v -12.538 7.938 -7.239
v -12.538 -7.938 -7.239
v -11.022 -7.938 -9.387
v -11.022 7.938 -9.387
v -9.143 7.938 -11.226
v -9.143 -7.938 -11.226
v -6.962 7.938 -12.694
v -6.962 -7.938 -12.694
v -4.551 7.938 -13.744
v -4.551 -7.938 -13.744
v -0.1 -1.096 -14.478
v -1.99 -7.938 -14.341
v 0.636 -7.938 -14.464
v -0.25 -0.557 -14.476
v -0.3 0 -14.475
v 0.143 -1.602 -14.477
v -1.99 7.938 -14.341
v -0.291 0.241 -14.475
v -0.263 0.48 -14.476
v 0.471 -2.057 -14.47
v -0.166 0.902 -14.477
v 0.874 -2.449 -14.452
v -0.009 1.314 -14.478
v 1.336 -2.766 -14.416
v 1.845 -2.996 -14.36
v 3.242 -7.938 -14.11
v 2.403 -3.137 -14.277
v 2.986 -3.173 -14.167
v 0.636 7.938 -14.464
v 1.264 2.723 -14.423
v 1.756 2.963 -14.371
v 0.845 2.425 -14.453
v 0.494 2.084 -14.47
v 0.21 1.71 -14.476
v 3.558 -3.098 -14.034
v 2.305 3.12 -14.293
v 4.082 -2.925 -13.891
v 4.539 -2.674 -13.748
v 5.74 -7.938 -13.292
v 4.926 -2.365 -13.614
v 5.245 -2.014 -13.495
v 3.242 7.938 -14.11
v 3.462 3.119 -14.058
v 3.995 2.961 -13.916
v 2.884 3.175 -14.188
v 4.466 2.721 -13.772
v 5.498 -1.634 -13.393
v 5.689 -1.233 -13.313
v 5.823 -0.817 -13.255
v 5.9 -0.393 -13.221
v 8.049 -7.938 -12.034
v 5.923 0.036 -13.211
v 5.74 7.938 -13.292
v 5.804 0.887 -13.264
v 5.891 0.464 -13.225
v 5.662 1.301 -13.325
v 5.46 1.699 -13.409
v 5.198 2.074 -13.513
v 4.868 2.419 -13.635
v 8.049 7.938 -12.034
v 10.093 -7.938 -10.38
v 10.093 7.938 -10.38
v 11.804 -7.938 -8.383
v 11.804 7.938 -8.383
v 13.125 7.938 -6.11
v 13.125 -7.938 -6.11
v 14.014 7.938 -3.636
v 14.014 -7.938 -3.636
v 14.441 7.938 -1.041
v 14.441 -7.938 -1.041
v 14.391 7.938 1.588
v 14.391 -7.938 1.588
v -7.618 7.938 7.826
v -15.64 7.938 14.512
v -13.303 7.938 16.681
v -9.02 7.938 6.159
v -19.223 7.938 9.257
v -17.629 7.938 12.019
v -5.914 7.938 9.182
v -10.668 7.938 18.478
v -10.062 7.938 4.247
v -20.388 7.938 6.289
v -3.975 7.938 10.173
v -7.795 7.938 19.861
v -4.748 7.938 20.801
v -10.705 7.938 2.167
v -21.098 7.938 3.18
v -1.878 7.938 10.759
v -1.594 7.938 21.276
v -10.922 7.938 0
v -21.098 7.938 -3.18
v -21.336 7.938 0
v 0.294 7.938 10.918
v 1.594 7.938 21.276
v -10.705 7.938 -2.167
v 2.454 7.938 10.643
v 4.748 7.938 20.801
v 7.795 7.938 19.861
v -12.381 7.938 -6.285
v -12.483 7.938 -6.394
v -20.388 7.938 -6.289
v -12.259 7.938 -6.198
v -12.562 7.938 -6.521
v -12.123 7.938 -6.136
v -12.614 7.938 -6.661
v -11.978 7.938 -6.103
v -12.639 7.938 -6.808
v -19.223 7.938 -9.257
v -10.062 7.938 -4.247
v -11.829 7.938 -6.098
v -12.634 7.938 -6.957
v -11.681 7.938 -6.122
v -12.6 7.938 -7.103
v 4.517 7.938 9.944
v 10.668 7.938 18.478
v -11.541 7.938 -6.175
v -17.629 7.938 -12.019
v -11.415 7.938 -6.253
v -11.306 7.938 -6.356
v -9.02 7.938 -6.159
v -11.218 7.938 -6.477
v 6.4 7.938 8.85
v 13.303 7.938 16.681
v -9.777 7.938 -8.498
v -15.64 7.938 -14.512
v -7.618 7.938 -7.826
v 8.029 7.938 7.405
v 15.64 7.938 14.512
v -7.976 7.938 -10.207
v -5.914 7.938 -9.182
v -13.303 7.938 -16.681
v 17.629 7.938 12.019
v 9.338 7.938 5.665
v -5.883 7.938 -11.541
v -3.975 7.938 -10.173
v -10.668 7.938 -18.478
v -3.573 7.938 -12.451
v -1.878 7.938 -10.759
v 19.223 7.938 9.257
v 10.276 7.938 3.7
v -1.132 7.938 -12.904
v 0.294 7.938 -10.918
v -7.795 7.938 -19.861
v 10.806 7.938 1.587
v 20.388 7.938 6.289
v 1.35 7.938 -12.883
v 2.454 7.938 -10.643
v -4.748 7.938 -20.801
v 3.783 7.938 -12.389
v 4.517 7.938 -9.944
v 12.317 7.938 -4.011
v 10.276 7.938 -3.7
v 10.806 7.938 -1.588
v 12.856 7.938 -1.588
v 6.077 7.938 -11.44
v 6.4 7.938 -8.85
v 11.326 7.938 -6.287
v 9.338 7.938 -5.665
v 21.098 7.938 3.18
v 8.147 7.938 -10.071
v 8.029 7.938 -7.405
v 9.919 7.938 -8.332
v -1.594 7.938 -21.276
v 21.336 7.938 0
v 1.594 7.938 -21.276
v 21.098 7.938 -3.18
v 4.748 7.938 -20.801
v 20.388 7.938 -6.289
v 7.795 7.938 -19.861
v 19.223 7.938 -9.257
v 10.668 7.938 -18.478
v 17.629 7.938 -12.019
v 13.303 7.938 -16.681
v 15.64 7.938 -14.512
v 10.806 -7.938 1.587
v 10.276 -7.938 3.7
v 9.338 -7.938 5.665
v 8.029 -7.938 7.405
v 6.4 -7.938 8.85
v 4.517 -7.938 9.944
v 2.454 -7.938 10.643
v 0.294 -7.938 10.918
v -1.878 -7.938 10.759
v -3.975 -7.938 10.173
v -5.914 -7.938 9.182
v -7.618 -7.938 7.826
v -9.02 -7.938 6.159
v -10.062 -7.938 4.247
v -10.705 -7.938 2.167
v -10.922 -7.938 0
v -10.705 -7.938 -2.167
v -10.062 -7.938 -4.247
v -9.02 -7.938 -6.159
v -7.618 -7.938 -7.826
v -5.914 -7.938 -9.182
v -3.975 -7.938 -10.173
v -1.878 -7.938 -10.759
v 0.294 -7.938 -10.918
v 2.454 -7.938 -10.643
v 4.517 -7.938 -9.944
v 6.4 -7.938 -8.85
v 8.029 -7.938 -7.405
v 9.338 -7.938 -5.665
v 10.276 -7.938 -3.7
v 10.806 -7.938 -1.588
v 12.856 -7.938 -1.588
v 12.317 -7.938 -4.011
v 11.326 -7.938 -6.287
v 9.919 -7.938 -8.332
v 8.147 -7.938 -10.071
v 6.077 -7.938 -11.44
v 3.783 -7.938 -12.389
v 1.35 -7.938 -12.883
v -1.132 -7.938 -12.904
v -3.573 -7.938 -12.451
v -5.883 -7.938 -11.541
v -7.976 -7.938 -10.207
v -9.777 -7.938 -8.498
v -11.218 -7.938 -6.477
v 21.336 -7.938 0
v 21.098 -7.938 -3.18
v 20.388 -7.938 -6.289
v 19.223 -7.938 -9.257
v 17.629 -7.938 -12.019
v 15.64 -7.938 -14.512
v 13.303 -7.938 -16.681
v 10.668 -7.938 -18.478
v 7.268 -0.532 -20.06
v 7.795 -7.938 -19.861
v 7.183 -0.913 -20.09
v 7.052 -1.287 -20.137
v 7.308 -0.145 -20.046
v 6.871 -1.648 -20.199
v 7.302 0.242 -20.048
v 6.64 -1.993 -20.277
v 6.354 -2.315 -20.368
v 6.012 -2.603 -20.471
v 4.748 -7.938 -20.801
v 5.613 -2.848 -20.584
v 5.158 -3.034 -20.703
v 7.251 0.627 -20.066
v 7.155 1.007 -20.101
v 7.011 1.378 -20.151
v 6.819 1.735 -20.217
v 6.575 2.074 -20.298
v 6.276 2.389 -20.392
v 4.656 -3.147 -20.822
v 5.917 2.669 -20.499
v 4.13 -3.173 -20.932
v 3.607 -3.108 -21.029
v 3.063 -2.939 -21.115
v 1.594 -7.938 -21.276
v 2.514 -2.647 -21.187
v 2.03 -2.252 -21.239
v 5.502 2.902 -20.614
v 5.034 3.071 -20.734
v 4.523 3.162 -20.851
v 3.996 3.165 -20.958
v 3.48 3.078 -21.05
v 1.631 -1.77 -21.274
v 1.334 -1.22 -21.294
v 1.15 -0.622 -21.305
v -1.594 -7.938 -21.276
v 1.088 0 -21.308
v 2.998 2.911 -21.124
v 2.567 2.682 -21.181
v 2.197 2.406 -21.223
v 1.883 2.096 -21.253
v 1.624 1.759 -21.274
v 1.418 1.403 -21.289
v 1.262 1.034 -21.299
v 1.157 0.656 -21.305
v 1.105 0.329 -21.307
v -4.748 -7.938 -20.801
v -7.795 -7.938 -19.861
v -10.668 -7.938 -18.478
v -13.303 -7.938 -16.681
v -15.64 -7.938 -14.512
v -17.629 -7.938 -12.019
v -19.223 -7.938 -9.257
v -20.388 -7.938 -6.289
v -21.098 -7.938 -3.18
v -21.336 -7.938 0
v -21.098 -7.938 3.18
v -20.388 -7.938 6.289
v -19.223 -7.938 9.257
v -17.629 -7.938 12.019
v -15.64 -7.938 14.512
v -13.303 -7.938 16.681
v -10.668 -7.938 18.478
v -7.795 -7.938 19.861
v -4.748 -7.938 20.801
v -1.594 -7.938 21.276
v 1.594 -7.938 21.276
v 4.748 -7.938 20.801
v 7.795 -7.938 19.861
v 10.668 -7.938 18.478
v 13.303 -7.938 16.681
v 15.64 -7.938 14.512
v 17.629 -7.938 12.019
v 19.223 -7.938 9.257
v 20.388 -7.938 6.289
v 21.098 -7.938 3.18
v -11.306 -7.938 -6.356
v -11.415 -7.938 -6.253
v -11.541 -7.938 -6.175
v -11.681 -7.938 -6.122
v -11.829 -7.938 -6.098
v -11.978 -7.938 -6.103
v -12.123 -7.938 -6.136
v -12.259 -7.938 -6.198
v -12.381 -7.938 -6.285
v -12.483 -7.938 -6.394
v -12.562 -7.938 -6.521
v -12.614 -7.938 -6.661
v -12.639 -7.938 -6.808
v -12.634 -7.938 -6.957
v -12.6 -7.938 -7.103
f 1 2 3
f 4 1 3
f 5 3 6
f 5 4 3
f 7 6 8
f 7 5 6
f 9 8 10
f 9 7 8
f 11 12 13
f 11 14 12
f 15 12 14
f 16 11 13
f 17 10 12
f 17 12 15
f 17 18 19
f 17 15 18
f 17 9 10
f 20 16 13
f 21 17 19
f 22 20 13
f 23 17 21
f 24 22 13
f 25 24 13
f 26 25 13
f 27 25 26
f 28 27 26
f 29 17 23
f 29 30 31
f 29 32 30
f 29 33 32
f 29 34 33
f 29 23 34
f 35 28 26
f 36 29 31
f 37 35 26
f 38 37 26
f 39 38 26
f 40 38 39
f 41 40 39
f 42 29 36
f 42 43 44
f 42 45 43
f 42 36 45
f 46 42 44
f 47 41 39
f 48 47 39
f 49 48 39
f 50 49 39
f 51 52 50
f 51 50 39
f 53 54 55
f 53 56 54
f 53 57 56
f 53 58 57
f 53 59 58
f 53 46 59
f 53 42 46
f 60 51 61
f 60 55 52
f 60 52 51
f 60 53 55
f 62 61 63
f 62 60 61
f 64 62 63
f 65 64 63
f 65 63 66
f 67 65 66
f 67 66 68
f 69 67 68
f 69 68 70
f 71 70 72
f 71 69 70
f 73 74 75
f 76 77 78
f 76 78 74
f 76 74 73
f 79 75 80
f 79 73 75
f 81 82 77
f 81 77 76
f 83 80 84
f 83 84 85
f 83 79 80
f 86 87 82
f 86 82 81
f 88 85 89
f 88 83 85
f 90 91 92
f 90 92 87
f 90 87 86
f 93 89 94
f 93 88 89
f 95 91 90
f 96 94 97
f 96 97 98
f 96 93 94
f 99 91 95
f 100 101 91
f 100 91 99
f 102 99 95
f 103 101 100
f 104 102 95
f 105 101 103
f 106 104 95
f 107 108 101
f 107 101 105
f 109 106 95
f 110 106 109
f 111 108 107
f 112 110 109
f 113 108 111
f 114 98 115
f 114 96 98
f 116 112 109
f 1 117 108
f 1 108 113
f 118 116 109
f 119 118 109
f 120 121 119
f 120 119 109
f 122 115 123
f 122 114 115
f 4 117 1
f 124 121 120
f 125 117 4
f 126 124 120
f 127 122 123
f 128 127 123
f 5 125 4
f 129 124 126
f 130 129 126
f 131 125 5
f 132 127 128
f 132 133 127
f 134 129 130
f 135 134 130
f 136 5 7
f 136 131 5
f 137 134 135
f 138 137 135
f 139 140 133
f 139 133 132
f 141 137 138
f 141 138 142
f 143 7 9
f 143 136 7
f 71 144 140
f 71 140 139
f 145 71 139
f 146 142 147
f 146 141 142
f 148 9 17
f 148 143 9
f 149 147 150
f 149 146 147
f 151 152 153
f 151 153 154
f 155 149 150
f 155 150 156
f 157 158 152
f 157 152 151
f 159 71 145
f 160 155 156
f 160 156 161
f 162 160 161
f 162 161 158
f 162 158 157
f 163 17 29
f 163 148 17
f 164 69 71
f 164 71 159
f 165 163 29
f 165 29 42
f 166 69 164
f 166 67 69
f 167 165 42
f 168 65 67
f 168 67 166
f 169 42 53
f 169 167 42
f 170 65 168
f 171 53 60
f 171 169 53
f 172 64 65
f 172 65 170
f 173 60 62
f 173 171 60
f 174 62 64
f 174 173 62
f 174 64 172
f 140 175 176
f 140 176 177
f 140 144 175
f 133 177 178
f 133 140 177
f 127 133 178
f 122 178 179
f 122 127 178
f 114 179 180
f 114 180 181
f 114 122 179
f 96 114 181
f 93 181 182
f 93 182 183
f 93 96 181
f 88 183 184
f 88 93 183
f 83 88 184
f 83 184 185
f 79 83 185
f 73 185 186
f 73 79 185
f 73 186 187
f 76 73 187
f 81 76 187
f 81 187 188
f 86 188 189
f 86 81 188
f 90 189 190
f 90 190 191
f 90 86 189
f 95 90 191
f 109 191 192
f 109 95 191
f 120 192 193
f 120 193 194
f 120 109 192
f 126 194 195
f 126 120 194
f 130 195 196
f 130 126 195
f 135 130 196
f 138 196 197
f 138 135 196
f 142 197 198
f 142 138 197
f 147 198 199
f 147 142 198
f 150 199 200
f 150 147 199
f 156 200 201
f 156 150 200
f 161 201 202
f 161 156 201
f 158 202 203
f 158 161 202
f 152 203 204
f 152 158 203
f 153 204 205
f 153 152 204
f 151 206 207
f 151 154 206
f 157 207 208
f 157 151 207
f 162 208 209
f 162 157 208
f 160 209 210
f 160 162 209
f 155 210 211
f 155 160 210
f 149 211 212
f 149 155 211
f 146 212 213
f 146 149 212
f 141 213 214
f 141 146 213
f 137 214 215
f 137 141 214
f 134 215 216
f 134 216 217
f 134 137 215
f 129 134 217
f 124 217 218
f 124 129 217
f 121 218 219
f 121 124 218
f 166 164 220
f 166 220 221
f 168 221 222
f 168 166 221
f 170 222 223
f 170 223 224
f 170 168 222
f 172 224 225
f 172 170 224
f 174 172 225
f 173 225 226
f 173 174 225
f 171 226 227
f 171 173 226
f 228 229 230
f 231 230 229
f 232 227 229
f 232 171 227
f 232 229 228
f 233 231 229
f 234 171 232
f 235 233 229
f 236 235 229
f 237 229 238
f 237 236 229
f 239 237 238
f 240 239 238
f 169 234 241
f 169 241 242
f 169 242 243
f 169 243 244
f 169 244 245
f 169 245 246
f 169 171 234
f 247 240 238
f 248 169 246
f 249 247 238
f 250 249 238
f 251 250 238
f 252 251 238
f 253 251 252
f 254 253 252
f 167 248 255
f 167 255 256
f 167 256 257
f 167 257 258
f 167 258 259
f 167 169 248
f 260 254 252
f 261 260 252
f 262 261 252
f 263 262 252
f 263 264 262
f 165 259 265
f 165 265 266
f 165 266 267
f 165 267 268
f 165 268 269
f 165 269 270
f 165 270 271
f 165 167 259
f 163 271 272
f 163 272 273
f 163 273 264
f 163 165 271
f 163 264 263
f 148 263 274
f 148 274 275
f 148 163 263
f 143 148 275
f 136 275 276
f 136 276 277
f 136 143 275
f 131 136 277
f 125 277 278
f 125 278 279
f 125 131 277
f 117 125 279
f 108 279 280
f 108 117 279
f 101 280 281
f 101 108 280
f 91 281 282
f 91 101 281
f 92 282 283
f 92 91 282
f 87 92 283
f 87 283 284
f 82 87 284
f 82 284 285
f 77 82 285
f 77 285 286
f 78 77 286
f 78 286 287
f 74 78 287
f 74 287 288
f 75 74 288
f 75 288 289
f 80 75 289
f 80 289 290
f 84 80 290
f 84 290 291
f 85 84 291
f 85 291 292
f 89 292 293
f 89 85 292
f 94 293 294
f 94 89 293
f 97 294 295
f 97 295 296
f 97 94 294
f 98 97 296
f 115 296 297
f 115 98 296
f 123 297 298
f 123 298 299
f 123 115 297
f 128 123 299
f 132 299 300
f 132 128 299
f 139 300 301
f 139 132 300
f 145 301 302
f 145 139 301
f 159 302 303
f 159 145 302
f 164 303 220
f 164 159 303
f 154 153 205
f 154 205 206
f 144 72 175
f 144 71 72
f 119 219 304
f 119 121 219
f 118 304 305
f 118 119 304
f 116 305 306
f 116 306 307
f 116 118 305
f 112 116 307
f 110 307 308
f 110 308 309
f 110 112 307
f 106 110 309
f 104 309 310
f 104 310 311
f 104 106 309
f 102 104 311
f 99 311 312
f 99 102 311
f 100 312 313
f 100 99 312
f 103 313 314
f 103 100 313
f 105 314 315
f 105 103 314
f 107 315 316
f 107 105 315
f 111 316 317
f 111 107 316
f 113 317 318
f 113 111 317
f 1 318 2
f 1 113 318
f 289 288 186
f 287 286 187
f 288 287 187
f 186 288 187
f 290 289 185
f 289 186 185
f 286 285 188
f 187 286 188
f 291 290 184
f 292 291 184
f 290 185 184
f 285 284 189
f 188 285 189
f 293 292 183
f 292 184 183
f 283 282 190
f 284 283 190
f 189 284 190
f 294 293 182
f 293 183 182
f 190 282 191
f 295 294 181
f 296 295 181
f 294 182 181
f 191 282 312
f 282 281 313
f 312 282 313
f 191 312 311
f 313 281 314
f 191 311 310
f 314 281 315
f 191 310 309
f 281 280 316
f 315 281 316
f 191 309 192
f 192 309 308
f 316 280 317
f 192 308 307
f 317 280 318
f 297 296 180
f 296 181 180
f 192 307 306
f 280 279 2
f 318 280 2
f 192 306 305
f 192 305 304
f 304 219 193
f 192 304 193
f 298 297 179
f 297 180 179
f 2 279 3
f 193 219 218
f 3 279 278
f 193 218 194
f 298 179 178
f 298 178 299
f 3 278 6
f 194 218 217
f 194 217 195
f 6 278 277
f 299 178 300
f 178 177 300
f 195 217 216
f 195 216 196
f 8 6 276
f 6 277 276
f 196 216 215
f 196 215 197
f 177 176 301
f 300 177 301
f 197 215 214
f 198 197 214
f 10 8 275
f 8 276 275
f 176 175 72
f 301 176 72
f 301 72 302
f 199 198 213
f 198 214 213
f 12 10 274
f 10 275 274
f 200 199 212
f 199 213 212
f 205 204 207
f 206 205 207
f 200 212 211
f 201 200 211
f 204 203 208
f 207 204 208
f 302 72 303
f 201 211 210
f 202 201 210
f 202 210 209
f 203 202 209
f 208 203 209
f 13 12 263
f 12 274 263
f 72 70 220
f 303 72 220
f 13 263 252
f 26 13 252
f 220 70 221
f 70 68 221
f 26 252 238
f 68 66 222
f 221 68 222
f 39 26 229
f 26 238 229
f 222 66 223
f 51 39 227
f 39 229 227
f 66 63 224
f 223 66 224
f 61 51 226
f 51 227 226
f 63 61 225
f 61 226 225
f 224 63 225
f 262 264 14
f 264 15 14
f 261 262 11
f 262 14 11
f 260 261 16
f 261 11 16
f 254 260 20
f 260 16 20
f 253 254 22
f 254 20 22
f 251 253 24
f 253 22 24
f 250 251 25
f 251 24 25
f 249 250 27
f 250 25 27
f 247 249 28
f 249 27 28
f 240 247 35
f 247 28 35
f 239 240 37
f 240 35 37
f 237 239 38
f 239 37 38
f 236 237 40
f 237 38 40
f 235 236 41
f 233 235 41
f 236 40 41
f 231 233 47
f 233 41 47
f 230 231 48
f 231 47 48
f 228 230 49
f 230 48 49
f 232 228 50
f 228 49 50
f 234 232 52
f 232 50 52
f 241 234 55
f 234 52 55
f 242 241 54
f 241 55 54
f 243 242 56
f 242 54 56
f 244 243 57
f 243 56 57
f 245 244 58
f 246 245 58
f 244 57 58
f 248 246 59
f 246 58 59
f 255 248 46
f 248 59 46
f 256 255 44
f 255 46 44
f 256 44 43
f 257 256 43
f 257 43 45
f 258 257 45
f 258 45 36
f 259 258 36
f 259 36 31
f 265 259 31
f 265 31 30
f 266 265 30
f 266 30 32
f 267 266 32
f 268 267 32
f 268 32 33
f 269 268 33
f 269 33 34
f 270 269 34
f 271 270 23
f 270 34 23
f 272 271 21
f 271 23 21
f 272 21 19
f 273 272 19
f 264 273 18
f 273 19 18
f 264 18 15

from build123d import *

# Parameters (mm, degrees)
SKETCH1_R           = 21.336
BOSS_EXTRUDE1_DEPTH = 7.9375


with BuildPart() as part:
    # Sketch1 → Boss-Extrude1 (new body, symmetric)
    with BuildSketch(Plane(origin=(0, 0, 0), x_dir=(1, 0, 0), z_dir=(0, 1, 0))):
        Circle(SKETCH1_R)
        with BuildLine():
            Line((10.806013499, 1.5875), (12.856358728, 1.5875))
            ThreePointArc((12.856358728, 1.5875), (2.578265605, 12.694828178), (-11.218493081, 6.477))
            ThreePointArc((-11.218493081, 6.477), (-12.259404438, 6.198088642), (-12.538315796, 7.239))
            ThreePointArc((-12.538315796, 7.239), (4.50939131, 13.757829553), (14.390702823, -1.5875))
            Line((14.390702823, -1.5875), (10.806013499, -1.5875))
            ThreePointArc((10.806013499, -1.5875), (-10.922, 0), (10.806013499, 1.5875))
        make_face(mode=Mode.SUBTRACT)
    extrude(amount=BOSS_EXTRUDE1_DEPTH, both=True)

    # Sketch2 → Cut-Revolve1 (revolve, cut)
    with BuildSketch(Plane(origin=(0, 0, 0), x_dir=(1, 0, 0), z_dir=(0, 1, 0))):
        Polygon((-0.300030586, 14.474890868), (2.811446909, 13.842963024), (4.246555115, 20.909128764), (1.13507762, 21.541056608), align=None)
    revolve(axis=Axis((2.811446909, 0, -13.842963024), (-0.199032392, 0, 0.979992912)), mode=Mode.SUBTRACT)


solid = part.part
